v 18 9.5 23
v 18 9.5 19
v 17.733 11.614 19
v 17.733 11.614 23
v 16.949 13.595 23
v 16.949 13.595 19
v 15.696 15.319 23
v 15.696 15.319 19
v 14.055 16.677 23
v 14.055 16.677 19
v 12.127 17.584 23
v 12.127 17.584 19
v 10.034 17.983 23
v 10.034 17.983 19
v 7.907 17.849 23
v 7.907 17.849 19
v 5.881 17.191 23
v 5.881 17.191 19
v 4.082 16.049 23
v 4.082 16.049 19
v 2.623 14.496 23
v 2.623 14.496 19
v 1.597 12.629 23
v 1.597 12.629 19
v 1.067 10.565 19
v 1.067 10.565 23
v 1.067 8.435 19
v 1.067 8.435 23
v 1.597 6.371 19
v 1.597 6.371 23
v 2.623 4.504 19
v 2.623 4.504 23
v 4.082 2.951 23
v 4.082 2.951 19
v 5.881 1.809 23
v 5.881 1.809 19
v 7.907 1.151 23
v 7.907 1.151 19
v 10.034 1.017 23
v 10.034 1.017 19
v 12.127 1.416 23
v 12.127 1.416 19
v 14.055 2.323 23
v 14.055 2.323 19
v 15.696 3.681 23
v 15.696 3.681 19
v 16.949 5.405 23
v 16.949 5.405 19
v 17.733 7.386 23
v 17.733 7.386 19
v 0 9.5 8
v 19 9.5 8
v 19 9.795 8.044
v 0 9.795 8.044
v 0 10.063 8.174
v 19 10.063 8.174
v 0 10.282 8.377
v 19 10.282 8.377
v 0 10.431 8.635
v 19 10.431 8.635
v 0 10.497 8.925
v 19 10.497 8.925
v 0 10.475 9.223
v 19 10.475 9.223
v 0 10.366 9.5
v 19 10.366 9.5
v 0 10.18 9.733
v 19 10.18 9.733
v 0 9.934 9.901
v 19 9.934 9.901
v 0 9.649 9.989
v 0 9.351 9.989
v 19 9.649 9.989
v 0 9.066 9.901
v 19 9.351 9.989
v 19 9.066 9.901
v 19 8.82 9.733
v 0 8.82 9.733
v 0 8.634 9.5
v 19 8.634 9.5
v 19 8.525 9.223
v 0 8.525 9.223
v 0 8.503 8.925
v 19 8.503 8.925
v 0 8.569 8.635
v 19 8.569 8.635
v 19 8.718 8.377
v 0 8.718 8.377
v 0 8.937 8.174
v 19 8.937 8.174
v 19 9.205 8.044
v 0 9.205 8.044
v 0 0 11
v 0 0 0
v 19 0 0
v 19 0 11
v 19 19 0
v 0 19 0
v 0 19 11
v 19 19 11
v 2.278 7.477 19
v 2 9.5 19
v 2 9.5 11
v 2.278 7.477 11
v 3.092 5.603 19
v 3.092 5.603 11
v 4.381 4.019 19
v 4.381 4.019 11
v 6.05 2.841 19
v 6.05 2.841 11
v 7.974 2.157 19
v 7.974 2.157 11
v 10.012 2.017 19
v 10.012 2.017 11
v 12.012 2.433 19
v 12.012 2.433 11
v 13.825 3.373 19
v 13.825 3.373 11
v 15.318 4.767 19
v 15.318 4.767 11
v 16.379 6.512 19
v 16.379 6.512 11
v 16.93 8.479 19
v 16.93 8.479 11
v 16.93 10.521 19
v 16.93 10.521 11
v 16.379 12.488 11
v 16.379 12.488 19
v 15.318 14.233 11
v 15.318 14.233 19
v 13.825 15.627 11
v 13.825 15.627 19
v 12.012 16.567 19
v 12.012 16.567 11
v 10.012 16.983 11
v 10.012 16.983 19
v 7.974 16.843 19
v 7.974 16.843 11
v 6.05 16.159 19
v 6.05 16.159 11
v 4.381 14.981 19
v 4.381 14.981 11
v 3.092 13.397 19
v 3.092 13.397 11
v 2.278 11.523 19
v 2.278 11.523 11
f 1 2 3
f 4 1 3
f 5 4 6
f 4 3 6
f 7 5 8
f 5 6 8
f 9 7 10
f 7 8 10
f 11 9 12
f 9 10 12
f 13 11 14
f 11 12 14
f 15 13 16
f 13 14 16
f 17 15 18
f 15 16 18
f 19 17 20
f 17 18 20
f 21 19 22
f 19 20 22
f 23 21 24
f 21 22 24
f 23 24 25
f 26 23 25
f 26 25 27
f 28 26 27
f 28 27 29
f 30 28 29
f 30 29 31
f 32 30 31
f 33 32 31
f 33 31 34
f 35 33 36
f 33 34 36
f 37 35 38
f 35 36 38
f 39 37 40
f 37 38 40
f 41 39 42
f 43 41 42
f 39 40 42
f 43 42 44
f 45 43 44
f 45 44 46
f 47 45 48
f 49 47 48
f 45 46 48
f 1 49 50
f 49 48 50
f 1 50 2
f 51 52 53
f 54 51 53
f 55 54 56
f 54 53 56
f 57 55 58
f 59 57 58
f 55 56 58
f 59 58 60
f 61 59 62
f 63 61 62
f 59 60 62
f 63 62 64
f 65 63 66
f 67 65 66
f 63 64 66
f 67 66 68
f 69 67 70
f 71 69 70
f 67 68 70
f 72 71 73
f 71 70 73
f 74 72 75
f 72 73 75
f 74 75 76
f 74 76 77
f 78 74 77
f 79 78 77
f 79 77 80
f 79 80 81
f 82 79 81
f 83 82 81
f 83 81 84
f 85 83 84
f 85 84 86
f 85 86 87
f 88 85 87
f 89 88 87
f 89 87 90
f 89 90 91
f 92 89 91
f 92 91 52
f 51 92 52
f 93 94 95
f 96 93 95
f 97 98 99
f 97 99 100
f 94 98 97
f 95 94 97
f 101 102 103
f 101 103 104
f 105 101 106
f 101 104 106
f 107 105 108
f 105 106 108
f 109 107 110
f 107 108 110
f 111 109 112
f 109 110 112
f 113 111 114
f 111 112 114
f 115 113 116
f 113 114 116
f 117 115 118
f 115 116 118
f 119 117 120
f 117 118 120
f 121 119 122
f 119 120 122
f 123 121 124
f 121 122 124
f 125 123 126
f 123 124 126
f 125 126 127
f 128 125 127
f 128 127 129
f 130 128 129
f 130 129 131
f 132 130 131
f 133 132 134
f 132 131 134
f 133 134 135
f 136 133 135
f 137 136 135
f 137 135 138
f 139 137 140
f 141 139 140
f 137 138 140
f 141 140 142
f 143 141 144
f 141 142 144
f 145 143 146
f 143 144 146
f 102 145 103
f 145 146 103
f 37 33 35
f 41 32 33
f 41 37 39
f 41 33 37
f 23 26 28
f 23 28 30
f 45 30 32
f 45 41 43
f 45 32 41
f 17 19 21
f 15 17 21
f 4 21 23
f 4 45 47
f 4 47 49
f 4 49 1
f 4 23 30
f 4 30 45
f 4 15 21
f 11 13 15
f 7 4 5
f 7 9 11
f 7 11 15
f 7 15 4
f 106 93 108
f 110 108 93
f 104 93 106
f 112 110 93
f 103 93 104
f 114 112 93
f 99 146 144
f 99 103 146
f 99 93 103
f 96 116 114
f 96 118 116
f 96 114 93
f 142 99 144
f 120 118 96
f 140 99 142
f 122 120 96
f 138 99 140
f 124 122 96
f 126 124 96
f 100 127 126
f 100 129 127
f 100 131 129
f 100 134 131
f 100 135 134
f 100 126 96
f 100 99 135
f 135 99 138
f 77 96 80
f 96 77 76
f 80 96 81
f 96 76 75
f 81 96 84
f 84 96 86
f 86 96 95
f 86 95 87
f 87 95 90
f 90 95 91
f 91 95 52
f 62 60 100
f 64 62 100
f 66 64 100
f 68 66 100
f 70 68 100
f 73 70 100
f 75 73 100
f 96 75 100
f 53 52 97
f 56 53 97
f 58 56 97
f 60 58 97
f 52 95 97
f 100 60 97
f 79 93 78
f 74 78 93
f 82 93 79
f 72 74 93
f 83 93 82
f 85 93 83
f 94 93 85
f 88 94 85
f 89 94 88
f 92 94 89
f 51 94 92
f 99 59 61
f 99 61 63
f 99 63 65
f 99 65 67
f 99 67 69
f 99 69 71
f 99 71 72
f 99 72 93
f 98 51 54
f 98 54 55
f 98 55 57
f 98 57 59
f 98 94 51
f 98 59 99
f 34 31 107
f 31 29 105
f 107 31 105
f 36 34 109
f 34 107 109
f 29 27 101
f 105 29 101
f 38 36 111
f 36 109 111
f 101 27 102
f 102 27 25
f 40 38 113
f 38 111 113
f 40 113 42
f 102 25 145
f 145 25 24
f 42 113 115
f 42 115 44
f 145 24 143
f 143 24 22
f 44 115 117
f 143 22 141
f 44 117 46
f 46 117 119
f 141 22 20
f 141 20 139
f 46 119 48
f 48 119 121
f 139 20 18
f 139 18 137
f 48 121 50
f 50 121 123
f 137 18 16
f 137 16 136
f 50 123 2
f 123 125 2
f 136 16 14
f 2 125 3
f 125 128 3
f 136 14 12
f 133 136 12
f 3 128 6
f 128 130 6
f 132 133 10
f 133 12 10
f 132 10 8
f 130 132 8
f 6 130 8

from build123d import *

# Parameters (mm, degrees)
SKETCH1_W           = 19
SKETCH1_H           = 19
BOSS_EXTRUDE1_DEPTH = 11
SKETCH2_R           = 7.5
BOSS_EXTRUDE2_DEPTH = 8
SKETCH4_R           = 8.5
BOSS_EXTRUDE3_DEPTH = 4
SKETCH3_R           = 1
CUT_EXTRUDE1_DEPTH  = 36.369478368


with BuildPart() as part:
    # Sketch1 → Boss-Extrude1 (new body)
    with BuildSketch(Plane.XY):
        with Locations((9.5, 9.5)):
            Rectangle(SKETCH1_W, SKETCH1_H)
    extrude(amount=BOSS_EXTRUDE1_DEPTH)

    # Sketch2 → Boss-Extrude2 (add)
    with BuildSketch(Plane.XY.offset(11)):
        with Locations(Location((9.5, 9.5, 0), (0, 0, 180))):
            Circle(SKETCH2_R)
    extrude(amount=BOSS_EXTRUDE2_DEPTH)

    # Sketch4 → Boss-Extrude3 (add)
    with BuildSketch(Plane.XY.offset(19)):
        with Locations((9.5, 9.5)):
            Circle(SKETCH4_R)
    extrude(amount=BOSS_EXTRUDE3_DEPTH)

    # Sketch3 → Cut-Extrude1 (cut, through all)
    with BuildSketch(Plane(origin=(19, 0, 0), x_dir=(0, 0, -1), z_dir=(1, 0, 0))):
        with Locations((-9, 9.5)):
            Circle(SKETCH3_R)
    extrude(amount=-CUT_EXTRUDE1_DEPTH, mode=Mode.SUBTRACT)


solid = part.part
